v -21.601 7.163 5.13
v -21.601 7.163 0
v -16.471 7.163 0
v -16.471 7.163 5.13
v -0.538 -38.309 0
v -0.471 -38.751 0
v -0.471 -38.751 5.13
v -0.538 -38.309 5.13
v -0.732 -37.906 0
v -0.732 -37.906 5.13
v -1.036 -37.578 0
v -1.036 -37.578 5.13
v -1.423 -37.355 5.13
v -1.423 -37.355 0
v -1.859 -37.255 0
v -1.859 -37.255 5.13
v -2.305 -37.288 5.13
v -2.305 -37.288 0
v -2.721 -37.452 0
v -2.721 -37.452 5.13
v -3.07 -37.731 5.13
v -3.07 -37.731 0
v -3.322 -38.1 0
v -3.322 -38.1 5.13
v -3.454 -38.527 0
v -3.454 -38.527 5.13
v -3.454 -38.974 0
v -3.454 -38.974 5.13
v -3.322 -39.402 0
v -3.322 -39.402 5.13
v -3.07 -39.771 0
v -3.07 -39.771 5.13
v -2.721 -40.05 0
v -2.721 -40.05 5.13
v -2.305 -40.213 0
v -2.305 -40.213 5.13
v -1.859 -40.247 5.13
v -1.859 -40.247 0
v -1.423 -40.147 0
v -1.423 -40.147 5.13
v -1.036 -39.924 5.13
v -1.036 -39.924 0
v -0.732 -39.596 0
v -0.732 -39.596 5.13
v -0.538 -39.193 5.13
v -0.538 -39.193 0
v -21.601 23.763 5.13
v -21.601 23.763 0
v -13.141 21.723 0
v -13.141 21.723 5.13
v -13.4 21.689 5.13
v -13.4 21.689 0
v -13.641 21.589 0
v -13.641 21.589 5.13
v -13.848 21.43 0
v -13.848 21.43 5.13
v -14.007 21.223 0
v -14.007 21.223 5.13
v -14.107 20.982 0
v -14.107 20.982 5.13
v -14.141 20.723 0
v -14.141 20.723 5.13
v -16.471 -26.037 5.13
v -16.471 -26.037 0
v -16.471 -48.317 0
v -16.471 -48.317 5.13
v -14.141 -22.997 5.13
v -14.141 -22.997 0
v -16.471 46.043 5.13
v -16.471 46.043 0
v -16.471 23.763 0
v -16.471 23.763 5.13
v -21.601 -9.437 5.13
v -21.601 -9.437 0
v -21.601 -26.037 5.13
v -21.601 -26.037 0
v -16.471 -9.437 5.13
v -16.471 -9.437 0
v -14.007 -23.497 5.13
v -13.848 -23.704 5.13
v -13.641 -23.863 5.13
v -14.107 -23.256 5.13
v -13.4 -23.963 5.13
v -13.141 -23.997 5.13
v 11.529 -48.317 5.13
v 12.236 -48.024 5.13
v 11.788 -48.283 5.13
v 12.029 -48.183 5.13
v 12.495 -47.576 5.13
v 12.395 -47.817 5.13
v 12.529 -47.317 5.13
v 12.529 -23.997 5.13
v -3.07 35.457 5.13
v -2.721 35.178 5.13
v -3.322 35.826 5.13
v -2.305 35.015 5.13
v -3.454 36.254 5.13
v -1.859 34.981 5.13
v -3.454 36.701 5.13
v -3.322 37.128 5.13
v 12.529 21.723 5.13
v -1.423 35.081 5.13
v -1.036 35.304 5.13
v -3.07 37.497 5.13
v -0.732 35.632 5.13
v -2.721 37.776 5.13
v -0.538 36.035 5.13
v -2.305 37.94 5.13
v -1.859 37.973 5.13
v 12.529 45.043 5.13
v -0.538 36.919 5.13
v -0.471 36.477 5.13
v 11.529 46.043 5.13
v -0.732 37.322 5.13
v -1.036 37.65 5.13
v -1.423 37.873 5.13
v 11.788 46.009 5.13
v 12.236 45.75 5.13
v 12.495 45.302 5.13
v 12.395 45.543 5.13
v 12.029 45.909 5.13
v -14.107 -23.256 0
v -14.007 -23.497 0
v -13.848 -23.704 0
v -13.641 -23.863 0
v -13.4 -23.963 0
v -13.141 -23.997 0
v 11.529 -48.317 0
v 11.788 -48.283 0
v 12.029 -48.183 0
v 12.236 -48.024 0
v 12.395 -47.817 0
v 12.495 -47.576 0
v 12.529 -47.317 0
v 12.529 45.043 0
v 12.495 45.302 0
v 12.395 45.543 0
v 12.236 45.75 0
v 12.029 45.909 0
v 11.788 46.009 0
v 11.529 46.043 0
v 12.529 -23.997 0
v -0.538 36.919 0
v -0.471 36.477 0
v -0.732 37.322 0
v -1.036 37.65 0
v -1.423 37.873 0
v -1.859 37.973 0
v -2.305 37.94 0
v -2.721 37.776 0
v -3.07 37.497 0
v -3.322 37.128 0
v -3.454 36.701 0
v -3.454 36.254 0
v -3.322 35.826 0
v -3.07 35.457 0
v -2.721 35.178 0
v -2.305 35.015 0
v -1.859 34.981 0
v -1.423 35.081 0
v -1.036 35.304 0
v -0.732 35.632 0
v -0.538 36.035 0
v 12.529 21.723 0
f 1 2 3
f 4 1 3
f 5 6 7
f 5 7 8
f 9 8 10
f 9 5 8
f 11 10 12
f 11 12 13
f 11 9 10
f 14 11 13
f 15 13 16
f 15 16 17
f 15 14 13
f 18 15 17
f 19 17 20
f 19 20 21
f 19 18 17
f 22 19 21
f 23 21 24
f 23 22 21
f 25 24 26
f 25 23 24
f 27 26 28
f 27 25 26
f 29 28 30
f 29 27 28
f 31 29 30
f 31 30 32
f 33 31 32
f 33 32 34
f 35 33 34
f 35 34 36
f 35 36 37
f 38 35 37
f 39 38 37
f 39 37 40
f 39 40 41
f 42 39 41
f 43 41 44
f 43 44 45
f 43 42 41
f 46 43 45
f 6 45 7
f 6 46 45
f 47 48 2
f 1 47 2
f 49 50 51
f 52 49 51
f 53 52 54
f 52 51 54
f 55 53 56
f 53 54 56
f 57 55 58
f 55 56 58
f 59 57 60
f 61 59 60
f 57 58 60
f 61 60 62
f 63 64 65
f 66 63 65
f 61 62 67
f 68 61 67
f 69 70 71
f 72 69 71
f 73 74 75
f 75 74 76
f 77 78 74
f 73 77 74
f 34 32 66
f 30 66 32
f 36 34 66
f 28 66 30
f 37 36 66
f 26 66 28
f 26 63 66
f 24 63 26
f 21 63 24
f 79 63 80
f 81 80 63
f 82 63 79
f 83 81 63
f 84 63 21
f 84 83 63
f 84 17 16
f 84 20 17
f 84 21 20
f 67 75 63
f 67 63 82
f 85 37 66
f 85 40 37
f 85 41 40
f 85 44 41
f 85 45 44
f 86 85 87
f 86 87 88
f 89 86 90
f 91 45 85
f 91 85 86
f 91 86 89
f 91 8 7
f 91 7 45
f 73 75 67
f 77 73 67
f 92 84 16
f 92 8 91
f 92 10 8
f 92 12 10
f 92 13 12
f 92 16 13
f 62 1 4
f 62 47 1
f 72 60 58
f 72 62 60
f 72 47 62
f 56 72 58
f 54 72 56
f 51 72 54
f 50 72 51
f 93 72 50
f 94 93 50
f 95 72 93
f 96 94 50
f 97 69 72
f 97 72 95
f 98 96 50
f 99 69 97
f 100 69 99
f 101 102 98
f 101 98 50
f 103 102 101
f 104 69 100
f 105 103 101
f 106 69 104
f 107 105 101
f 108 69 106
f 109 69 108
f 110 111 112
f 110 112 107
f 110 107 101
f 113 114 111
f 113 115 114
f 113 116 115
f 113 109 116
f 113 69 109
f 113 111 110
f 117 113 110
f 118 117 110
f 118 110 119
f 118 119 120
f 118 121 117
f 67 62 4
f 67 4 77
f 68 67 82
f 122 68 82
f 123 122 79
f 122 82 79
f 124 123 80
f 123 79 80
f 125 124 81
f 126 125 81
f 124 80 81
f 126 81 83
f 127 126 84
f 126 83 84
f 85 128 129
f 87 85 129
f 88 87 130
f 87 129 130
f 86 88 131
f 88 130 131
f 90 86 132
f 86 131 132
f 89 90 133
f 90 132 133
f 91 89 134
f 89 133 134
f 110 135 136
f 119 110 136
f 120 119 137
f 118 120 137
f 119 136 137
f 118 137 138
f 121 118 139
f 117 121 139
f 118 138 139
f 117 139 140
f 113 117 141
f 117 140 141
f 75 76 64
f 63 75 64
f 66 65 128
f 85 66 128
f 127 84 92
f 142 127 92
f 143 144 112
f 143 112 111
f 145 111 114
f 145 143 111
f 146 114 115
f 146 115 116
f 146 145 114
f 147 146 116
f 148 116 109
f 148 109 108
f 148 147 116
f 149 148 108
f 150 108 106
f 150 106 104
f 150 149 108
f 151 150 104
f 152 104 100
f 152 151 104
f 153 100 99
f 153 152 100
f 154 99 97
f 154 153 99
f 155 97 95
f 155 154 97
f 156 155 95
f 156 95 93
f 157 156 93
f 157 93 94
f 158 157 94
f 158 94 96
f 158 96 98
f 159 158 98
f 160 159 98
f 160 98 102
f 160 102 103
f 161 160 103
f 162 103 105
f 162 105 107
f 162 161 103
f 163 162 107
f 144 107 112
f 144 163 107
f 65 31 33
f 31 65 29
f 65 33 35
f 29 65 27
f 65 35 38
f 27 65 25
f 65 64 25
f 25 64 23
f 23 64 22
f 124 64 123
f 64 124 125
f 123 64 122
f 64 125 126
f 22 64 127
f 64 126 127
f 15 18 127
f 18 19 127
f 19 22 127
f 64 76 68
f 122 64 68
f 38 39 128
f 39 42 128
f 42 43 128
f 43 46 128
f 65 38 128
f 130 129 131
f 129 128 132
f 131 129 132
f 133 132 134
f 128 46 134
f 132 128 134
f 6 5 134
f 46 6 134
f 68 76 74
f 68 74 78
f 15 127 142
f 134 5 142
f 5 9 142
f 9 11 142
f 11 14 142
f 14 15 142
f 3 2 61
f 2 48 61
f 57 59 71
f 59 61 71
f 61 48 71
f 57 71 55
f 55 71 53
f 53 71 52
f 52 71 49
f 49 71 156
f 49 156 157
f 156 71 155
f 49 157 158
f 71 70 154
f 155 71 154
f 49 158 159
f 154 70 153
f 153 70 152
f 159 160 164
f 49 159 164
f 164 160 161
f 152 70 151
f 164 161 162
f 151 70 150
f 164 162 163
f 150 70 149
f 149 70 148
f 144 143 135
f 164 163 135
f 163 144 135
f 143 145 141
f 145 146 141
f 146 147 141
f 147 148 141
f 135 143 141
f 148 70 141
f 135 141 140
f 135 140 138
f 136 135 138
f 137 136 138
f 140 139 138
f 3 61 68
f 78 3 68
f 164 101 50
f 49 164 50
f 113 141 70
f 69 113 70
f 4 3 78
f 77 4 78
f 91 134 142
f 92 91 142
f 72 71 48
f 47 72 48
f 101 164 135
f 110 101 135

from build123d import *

# Parameters (mm, degrees)
SKETCH1_R           = 1.5
BOSS_EXTRUDE1_DEPTH = 5.13
CUT_EXTRUDE1_REACH  = 7.13


with BuildPart() as part:
    # Sketch1 → Boss-Extrude1 (new body)
    with BuildSketch(Plane.XY):
        with BuildLine():
            Line((-16.470914087, 7.163135174), (-16.470914087, -9.436864826))
            Line((-16.470914087, -9.436864826), (-21.600914087, -9.436864826))
            Line((-21.600914087, -9.436864826), (-21.600914087, -26.036864826))
            Line((-21.600914087, -26.036864826), (-16.470914087, -26.036864826))
            Line((-16.470914087, -26.036864826), (-16.470914087, -48.316864826))
            Line((-16.470914087, -48.316864826), (11.529085913, -48.316864826))
            ThreePointArc((11.529085913, -48.316864826), (12.236192694, -48.023971608), (12.529085913, -47.316864826))
            Line((12.529085913, -47.316864826), (12.529085913, 45.043135174))
            ThreePointArc((12.529085913, 45.043135174), (12.236192694, 45.750241955), (11.529085913, 46.043135174))
            Line((11.529085913, 46.043135174), (-16.470914087, 46.043135174))
            Line((-16.470914087, 46.043135174), (-16.470914087, 23.763135174))
            Line((-16.470914087, 23.763135174), (-21.600914087, 23.763135174))
            Line((-21.600914087, 23.763135174), (-21.600914087, 7.163135174))
            Line((-21.600914087, 7.163135174), (-16.470914087, 7.163135174))
        make_face()
        with Locations((-1.970914087, -38.750864826)):
            Circle(SKETCH1_R, mode=Mode.SUBTRACT)
        with Locations((-1.970914087, 36.477135174)):
            Circle(SKETCH1_R, mode=Mode.SUBTRACT)
    extrude(amount=BOSS_EXTRUDE1_DEPTH)

    # Sketch2 → Cut-Extrude1 (cut, up to next)
    with BuildSketch(Plane.XY.offset(5.13), mode=Mode.PRIVATE) as cut_extrude1_sk1:
        with BuildLine():
            Line((12.529085913, 21.723135174), (-13.140914087, 21.723135174))
            ThreePointArc((-13.140914087, 21.723135174), (-13.848020868, 21.430241955), (-14.140914087, 20.723135174))
            Line((-14.140914087, 20.723135174), (-14.140914087, -22.996864826))
            ThreePointArc((-14.140914087, -22.996864826), (-13.848020868, -23.703971608), (-13.140914087, -23.996864826))
            Line((-13.140914087, -23.996864826), (12.529085913, -23.996864826))
            Line((12.529085913, -23.996864826), (12.529085913, 21.723135174))
        make_face()
    cut_extrude1_tool1 = extrude(cut_extrude1_sk1.sketch, amount=-CUT_EXTRUDE1_REACH, mode=Mode.PRIVATE) & part.part
    add(cut_extrude1_tool1.solids().sort_by_distance((-0.801297, -1.136865, 5.13))[0], mode=Mode.SUBTRACT)


solid = part.part
